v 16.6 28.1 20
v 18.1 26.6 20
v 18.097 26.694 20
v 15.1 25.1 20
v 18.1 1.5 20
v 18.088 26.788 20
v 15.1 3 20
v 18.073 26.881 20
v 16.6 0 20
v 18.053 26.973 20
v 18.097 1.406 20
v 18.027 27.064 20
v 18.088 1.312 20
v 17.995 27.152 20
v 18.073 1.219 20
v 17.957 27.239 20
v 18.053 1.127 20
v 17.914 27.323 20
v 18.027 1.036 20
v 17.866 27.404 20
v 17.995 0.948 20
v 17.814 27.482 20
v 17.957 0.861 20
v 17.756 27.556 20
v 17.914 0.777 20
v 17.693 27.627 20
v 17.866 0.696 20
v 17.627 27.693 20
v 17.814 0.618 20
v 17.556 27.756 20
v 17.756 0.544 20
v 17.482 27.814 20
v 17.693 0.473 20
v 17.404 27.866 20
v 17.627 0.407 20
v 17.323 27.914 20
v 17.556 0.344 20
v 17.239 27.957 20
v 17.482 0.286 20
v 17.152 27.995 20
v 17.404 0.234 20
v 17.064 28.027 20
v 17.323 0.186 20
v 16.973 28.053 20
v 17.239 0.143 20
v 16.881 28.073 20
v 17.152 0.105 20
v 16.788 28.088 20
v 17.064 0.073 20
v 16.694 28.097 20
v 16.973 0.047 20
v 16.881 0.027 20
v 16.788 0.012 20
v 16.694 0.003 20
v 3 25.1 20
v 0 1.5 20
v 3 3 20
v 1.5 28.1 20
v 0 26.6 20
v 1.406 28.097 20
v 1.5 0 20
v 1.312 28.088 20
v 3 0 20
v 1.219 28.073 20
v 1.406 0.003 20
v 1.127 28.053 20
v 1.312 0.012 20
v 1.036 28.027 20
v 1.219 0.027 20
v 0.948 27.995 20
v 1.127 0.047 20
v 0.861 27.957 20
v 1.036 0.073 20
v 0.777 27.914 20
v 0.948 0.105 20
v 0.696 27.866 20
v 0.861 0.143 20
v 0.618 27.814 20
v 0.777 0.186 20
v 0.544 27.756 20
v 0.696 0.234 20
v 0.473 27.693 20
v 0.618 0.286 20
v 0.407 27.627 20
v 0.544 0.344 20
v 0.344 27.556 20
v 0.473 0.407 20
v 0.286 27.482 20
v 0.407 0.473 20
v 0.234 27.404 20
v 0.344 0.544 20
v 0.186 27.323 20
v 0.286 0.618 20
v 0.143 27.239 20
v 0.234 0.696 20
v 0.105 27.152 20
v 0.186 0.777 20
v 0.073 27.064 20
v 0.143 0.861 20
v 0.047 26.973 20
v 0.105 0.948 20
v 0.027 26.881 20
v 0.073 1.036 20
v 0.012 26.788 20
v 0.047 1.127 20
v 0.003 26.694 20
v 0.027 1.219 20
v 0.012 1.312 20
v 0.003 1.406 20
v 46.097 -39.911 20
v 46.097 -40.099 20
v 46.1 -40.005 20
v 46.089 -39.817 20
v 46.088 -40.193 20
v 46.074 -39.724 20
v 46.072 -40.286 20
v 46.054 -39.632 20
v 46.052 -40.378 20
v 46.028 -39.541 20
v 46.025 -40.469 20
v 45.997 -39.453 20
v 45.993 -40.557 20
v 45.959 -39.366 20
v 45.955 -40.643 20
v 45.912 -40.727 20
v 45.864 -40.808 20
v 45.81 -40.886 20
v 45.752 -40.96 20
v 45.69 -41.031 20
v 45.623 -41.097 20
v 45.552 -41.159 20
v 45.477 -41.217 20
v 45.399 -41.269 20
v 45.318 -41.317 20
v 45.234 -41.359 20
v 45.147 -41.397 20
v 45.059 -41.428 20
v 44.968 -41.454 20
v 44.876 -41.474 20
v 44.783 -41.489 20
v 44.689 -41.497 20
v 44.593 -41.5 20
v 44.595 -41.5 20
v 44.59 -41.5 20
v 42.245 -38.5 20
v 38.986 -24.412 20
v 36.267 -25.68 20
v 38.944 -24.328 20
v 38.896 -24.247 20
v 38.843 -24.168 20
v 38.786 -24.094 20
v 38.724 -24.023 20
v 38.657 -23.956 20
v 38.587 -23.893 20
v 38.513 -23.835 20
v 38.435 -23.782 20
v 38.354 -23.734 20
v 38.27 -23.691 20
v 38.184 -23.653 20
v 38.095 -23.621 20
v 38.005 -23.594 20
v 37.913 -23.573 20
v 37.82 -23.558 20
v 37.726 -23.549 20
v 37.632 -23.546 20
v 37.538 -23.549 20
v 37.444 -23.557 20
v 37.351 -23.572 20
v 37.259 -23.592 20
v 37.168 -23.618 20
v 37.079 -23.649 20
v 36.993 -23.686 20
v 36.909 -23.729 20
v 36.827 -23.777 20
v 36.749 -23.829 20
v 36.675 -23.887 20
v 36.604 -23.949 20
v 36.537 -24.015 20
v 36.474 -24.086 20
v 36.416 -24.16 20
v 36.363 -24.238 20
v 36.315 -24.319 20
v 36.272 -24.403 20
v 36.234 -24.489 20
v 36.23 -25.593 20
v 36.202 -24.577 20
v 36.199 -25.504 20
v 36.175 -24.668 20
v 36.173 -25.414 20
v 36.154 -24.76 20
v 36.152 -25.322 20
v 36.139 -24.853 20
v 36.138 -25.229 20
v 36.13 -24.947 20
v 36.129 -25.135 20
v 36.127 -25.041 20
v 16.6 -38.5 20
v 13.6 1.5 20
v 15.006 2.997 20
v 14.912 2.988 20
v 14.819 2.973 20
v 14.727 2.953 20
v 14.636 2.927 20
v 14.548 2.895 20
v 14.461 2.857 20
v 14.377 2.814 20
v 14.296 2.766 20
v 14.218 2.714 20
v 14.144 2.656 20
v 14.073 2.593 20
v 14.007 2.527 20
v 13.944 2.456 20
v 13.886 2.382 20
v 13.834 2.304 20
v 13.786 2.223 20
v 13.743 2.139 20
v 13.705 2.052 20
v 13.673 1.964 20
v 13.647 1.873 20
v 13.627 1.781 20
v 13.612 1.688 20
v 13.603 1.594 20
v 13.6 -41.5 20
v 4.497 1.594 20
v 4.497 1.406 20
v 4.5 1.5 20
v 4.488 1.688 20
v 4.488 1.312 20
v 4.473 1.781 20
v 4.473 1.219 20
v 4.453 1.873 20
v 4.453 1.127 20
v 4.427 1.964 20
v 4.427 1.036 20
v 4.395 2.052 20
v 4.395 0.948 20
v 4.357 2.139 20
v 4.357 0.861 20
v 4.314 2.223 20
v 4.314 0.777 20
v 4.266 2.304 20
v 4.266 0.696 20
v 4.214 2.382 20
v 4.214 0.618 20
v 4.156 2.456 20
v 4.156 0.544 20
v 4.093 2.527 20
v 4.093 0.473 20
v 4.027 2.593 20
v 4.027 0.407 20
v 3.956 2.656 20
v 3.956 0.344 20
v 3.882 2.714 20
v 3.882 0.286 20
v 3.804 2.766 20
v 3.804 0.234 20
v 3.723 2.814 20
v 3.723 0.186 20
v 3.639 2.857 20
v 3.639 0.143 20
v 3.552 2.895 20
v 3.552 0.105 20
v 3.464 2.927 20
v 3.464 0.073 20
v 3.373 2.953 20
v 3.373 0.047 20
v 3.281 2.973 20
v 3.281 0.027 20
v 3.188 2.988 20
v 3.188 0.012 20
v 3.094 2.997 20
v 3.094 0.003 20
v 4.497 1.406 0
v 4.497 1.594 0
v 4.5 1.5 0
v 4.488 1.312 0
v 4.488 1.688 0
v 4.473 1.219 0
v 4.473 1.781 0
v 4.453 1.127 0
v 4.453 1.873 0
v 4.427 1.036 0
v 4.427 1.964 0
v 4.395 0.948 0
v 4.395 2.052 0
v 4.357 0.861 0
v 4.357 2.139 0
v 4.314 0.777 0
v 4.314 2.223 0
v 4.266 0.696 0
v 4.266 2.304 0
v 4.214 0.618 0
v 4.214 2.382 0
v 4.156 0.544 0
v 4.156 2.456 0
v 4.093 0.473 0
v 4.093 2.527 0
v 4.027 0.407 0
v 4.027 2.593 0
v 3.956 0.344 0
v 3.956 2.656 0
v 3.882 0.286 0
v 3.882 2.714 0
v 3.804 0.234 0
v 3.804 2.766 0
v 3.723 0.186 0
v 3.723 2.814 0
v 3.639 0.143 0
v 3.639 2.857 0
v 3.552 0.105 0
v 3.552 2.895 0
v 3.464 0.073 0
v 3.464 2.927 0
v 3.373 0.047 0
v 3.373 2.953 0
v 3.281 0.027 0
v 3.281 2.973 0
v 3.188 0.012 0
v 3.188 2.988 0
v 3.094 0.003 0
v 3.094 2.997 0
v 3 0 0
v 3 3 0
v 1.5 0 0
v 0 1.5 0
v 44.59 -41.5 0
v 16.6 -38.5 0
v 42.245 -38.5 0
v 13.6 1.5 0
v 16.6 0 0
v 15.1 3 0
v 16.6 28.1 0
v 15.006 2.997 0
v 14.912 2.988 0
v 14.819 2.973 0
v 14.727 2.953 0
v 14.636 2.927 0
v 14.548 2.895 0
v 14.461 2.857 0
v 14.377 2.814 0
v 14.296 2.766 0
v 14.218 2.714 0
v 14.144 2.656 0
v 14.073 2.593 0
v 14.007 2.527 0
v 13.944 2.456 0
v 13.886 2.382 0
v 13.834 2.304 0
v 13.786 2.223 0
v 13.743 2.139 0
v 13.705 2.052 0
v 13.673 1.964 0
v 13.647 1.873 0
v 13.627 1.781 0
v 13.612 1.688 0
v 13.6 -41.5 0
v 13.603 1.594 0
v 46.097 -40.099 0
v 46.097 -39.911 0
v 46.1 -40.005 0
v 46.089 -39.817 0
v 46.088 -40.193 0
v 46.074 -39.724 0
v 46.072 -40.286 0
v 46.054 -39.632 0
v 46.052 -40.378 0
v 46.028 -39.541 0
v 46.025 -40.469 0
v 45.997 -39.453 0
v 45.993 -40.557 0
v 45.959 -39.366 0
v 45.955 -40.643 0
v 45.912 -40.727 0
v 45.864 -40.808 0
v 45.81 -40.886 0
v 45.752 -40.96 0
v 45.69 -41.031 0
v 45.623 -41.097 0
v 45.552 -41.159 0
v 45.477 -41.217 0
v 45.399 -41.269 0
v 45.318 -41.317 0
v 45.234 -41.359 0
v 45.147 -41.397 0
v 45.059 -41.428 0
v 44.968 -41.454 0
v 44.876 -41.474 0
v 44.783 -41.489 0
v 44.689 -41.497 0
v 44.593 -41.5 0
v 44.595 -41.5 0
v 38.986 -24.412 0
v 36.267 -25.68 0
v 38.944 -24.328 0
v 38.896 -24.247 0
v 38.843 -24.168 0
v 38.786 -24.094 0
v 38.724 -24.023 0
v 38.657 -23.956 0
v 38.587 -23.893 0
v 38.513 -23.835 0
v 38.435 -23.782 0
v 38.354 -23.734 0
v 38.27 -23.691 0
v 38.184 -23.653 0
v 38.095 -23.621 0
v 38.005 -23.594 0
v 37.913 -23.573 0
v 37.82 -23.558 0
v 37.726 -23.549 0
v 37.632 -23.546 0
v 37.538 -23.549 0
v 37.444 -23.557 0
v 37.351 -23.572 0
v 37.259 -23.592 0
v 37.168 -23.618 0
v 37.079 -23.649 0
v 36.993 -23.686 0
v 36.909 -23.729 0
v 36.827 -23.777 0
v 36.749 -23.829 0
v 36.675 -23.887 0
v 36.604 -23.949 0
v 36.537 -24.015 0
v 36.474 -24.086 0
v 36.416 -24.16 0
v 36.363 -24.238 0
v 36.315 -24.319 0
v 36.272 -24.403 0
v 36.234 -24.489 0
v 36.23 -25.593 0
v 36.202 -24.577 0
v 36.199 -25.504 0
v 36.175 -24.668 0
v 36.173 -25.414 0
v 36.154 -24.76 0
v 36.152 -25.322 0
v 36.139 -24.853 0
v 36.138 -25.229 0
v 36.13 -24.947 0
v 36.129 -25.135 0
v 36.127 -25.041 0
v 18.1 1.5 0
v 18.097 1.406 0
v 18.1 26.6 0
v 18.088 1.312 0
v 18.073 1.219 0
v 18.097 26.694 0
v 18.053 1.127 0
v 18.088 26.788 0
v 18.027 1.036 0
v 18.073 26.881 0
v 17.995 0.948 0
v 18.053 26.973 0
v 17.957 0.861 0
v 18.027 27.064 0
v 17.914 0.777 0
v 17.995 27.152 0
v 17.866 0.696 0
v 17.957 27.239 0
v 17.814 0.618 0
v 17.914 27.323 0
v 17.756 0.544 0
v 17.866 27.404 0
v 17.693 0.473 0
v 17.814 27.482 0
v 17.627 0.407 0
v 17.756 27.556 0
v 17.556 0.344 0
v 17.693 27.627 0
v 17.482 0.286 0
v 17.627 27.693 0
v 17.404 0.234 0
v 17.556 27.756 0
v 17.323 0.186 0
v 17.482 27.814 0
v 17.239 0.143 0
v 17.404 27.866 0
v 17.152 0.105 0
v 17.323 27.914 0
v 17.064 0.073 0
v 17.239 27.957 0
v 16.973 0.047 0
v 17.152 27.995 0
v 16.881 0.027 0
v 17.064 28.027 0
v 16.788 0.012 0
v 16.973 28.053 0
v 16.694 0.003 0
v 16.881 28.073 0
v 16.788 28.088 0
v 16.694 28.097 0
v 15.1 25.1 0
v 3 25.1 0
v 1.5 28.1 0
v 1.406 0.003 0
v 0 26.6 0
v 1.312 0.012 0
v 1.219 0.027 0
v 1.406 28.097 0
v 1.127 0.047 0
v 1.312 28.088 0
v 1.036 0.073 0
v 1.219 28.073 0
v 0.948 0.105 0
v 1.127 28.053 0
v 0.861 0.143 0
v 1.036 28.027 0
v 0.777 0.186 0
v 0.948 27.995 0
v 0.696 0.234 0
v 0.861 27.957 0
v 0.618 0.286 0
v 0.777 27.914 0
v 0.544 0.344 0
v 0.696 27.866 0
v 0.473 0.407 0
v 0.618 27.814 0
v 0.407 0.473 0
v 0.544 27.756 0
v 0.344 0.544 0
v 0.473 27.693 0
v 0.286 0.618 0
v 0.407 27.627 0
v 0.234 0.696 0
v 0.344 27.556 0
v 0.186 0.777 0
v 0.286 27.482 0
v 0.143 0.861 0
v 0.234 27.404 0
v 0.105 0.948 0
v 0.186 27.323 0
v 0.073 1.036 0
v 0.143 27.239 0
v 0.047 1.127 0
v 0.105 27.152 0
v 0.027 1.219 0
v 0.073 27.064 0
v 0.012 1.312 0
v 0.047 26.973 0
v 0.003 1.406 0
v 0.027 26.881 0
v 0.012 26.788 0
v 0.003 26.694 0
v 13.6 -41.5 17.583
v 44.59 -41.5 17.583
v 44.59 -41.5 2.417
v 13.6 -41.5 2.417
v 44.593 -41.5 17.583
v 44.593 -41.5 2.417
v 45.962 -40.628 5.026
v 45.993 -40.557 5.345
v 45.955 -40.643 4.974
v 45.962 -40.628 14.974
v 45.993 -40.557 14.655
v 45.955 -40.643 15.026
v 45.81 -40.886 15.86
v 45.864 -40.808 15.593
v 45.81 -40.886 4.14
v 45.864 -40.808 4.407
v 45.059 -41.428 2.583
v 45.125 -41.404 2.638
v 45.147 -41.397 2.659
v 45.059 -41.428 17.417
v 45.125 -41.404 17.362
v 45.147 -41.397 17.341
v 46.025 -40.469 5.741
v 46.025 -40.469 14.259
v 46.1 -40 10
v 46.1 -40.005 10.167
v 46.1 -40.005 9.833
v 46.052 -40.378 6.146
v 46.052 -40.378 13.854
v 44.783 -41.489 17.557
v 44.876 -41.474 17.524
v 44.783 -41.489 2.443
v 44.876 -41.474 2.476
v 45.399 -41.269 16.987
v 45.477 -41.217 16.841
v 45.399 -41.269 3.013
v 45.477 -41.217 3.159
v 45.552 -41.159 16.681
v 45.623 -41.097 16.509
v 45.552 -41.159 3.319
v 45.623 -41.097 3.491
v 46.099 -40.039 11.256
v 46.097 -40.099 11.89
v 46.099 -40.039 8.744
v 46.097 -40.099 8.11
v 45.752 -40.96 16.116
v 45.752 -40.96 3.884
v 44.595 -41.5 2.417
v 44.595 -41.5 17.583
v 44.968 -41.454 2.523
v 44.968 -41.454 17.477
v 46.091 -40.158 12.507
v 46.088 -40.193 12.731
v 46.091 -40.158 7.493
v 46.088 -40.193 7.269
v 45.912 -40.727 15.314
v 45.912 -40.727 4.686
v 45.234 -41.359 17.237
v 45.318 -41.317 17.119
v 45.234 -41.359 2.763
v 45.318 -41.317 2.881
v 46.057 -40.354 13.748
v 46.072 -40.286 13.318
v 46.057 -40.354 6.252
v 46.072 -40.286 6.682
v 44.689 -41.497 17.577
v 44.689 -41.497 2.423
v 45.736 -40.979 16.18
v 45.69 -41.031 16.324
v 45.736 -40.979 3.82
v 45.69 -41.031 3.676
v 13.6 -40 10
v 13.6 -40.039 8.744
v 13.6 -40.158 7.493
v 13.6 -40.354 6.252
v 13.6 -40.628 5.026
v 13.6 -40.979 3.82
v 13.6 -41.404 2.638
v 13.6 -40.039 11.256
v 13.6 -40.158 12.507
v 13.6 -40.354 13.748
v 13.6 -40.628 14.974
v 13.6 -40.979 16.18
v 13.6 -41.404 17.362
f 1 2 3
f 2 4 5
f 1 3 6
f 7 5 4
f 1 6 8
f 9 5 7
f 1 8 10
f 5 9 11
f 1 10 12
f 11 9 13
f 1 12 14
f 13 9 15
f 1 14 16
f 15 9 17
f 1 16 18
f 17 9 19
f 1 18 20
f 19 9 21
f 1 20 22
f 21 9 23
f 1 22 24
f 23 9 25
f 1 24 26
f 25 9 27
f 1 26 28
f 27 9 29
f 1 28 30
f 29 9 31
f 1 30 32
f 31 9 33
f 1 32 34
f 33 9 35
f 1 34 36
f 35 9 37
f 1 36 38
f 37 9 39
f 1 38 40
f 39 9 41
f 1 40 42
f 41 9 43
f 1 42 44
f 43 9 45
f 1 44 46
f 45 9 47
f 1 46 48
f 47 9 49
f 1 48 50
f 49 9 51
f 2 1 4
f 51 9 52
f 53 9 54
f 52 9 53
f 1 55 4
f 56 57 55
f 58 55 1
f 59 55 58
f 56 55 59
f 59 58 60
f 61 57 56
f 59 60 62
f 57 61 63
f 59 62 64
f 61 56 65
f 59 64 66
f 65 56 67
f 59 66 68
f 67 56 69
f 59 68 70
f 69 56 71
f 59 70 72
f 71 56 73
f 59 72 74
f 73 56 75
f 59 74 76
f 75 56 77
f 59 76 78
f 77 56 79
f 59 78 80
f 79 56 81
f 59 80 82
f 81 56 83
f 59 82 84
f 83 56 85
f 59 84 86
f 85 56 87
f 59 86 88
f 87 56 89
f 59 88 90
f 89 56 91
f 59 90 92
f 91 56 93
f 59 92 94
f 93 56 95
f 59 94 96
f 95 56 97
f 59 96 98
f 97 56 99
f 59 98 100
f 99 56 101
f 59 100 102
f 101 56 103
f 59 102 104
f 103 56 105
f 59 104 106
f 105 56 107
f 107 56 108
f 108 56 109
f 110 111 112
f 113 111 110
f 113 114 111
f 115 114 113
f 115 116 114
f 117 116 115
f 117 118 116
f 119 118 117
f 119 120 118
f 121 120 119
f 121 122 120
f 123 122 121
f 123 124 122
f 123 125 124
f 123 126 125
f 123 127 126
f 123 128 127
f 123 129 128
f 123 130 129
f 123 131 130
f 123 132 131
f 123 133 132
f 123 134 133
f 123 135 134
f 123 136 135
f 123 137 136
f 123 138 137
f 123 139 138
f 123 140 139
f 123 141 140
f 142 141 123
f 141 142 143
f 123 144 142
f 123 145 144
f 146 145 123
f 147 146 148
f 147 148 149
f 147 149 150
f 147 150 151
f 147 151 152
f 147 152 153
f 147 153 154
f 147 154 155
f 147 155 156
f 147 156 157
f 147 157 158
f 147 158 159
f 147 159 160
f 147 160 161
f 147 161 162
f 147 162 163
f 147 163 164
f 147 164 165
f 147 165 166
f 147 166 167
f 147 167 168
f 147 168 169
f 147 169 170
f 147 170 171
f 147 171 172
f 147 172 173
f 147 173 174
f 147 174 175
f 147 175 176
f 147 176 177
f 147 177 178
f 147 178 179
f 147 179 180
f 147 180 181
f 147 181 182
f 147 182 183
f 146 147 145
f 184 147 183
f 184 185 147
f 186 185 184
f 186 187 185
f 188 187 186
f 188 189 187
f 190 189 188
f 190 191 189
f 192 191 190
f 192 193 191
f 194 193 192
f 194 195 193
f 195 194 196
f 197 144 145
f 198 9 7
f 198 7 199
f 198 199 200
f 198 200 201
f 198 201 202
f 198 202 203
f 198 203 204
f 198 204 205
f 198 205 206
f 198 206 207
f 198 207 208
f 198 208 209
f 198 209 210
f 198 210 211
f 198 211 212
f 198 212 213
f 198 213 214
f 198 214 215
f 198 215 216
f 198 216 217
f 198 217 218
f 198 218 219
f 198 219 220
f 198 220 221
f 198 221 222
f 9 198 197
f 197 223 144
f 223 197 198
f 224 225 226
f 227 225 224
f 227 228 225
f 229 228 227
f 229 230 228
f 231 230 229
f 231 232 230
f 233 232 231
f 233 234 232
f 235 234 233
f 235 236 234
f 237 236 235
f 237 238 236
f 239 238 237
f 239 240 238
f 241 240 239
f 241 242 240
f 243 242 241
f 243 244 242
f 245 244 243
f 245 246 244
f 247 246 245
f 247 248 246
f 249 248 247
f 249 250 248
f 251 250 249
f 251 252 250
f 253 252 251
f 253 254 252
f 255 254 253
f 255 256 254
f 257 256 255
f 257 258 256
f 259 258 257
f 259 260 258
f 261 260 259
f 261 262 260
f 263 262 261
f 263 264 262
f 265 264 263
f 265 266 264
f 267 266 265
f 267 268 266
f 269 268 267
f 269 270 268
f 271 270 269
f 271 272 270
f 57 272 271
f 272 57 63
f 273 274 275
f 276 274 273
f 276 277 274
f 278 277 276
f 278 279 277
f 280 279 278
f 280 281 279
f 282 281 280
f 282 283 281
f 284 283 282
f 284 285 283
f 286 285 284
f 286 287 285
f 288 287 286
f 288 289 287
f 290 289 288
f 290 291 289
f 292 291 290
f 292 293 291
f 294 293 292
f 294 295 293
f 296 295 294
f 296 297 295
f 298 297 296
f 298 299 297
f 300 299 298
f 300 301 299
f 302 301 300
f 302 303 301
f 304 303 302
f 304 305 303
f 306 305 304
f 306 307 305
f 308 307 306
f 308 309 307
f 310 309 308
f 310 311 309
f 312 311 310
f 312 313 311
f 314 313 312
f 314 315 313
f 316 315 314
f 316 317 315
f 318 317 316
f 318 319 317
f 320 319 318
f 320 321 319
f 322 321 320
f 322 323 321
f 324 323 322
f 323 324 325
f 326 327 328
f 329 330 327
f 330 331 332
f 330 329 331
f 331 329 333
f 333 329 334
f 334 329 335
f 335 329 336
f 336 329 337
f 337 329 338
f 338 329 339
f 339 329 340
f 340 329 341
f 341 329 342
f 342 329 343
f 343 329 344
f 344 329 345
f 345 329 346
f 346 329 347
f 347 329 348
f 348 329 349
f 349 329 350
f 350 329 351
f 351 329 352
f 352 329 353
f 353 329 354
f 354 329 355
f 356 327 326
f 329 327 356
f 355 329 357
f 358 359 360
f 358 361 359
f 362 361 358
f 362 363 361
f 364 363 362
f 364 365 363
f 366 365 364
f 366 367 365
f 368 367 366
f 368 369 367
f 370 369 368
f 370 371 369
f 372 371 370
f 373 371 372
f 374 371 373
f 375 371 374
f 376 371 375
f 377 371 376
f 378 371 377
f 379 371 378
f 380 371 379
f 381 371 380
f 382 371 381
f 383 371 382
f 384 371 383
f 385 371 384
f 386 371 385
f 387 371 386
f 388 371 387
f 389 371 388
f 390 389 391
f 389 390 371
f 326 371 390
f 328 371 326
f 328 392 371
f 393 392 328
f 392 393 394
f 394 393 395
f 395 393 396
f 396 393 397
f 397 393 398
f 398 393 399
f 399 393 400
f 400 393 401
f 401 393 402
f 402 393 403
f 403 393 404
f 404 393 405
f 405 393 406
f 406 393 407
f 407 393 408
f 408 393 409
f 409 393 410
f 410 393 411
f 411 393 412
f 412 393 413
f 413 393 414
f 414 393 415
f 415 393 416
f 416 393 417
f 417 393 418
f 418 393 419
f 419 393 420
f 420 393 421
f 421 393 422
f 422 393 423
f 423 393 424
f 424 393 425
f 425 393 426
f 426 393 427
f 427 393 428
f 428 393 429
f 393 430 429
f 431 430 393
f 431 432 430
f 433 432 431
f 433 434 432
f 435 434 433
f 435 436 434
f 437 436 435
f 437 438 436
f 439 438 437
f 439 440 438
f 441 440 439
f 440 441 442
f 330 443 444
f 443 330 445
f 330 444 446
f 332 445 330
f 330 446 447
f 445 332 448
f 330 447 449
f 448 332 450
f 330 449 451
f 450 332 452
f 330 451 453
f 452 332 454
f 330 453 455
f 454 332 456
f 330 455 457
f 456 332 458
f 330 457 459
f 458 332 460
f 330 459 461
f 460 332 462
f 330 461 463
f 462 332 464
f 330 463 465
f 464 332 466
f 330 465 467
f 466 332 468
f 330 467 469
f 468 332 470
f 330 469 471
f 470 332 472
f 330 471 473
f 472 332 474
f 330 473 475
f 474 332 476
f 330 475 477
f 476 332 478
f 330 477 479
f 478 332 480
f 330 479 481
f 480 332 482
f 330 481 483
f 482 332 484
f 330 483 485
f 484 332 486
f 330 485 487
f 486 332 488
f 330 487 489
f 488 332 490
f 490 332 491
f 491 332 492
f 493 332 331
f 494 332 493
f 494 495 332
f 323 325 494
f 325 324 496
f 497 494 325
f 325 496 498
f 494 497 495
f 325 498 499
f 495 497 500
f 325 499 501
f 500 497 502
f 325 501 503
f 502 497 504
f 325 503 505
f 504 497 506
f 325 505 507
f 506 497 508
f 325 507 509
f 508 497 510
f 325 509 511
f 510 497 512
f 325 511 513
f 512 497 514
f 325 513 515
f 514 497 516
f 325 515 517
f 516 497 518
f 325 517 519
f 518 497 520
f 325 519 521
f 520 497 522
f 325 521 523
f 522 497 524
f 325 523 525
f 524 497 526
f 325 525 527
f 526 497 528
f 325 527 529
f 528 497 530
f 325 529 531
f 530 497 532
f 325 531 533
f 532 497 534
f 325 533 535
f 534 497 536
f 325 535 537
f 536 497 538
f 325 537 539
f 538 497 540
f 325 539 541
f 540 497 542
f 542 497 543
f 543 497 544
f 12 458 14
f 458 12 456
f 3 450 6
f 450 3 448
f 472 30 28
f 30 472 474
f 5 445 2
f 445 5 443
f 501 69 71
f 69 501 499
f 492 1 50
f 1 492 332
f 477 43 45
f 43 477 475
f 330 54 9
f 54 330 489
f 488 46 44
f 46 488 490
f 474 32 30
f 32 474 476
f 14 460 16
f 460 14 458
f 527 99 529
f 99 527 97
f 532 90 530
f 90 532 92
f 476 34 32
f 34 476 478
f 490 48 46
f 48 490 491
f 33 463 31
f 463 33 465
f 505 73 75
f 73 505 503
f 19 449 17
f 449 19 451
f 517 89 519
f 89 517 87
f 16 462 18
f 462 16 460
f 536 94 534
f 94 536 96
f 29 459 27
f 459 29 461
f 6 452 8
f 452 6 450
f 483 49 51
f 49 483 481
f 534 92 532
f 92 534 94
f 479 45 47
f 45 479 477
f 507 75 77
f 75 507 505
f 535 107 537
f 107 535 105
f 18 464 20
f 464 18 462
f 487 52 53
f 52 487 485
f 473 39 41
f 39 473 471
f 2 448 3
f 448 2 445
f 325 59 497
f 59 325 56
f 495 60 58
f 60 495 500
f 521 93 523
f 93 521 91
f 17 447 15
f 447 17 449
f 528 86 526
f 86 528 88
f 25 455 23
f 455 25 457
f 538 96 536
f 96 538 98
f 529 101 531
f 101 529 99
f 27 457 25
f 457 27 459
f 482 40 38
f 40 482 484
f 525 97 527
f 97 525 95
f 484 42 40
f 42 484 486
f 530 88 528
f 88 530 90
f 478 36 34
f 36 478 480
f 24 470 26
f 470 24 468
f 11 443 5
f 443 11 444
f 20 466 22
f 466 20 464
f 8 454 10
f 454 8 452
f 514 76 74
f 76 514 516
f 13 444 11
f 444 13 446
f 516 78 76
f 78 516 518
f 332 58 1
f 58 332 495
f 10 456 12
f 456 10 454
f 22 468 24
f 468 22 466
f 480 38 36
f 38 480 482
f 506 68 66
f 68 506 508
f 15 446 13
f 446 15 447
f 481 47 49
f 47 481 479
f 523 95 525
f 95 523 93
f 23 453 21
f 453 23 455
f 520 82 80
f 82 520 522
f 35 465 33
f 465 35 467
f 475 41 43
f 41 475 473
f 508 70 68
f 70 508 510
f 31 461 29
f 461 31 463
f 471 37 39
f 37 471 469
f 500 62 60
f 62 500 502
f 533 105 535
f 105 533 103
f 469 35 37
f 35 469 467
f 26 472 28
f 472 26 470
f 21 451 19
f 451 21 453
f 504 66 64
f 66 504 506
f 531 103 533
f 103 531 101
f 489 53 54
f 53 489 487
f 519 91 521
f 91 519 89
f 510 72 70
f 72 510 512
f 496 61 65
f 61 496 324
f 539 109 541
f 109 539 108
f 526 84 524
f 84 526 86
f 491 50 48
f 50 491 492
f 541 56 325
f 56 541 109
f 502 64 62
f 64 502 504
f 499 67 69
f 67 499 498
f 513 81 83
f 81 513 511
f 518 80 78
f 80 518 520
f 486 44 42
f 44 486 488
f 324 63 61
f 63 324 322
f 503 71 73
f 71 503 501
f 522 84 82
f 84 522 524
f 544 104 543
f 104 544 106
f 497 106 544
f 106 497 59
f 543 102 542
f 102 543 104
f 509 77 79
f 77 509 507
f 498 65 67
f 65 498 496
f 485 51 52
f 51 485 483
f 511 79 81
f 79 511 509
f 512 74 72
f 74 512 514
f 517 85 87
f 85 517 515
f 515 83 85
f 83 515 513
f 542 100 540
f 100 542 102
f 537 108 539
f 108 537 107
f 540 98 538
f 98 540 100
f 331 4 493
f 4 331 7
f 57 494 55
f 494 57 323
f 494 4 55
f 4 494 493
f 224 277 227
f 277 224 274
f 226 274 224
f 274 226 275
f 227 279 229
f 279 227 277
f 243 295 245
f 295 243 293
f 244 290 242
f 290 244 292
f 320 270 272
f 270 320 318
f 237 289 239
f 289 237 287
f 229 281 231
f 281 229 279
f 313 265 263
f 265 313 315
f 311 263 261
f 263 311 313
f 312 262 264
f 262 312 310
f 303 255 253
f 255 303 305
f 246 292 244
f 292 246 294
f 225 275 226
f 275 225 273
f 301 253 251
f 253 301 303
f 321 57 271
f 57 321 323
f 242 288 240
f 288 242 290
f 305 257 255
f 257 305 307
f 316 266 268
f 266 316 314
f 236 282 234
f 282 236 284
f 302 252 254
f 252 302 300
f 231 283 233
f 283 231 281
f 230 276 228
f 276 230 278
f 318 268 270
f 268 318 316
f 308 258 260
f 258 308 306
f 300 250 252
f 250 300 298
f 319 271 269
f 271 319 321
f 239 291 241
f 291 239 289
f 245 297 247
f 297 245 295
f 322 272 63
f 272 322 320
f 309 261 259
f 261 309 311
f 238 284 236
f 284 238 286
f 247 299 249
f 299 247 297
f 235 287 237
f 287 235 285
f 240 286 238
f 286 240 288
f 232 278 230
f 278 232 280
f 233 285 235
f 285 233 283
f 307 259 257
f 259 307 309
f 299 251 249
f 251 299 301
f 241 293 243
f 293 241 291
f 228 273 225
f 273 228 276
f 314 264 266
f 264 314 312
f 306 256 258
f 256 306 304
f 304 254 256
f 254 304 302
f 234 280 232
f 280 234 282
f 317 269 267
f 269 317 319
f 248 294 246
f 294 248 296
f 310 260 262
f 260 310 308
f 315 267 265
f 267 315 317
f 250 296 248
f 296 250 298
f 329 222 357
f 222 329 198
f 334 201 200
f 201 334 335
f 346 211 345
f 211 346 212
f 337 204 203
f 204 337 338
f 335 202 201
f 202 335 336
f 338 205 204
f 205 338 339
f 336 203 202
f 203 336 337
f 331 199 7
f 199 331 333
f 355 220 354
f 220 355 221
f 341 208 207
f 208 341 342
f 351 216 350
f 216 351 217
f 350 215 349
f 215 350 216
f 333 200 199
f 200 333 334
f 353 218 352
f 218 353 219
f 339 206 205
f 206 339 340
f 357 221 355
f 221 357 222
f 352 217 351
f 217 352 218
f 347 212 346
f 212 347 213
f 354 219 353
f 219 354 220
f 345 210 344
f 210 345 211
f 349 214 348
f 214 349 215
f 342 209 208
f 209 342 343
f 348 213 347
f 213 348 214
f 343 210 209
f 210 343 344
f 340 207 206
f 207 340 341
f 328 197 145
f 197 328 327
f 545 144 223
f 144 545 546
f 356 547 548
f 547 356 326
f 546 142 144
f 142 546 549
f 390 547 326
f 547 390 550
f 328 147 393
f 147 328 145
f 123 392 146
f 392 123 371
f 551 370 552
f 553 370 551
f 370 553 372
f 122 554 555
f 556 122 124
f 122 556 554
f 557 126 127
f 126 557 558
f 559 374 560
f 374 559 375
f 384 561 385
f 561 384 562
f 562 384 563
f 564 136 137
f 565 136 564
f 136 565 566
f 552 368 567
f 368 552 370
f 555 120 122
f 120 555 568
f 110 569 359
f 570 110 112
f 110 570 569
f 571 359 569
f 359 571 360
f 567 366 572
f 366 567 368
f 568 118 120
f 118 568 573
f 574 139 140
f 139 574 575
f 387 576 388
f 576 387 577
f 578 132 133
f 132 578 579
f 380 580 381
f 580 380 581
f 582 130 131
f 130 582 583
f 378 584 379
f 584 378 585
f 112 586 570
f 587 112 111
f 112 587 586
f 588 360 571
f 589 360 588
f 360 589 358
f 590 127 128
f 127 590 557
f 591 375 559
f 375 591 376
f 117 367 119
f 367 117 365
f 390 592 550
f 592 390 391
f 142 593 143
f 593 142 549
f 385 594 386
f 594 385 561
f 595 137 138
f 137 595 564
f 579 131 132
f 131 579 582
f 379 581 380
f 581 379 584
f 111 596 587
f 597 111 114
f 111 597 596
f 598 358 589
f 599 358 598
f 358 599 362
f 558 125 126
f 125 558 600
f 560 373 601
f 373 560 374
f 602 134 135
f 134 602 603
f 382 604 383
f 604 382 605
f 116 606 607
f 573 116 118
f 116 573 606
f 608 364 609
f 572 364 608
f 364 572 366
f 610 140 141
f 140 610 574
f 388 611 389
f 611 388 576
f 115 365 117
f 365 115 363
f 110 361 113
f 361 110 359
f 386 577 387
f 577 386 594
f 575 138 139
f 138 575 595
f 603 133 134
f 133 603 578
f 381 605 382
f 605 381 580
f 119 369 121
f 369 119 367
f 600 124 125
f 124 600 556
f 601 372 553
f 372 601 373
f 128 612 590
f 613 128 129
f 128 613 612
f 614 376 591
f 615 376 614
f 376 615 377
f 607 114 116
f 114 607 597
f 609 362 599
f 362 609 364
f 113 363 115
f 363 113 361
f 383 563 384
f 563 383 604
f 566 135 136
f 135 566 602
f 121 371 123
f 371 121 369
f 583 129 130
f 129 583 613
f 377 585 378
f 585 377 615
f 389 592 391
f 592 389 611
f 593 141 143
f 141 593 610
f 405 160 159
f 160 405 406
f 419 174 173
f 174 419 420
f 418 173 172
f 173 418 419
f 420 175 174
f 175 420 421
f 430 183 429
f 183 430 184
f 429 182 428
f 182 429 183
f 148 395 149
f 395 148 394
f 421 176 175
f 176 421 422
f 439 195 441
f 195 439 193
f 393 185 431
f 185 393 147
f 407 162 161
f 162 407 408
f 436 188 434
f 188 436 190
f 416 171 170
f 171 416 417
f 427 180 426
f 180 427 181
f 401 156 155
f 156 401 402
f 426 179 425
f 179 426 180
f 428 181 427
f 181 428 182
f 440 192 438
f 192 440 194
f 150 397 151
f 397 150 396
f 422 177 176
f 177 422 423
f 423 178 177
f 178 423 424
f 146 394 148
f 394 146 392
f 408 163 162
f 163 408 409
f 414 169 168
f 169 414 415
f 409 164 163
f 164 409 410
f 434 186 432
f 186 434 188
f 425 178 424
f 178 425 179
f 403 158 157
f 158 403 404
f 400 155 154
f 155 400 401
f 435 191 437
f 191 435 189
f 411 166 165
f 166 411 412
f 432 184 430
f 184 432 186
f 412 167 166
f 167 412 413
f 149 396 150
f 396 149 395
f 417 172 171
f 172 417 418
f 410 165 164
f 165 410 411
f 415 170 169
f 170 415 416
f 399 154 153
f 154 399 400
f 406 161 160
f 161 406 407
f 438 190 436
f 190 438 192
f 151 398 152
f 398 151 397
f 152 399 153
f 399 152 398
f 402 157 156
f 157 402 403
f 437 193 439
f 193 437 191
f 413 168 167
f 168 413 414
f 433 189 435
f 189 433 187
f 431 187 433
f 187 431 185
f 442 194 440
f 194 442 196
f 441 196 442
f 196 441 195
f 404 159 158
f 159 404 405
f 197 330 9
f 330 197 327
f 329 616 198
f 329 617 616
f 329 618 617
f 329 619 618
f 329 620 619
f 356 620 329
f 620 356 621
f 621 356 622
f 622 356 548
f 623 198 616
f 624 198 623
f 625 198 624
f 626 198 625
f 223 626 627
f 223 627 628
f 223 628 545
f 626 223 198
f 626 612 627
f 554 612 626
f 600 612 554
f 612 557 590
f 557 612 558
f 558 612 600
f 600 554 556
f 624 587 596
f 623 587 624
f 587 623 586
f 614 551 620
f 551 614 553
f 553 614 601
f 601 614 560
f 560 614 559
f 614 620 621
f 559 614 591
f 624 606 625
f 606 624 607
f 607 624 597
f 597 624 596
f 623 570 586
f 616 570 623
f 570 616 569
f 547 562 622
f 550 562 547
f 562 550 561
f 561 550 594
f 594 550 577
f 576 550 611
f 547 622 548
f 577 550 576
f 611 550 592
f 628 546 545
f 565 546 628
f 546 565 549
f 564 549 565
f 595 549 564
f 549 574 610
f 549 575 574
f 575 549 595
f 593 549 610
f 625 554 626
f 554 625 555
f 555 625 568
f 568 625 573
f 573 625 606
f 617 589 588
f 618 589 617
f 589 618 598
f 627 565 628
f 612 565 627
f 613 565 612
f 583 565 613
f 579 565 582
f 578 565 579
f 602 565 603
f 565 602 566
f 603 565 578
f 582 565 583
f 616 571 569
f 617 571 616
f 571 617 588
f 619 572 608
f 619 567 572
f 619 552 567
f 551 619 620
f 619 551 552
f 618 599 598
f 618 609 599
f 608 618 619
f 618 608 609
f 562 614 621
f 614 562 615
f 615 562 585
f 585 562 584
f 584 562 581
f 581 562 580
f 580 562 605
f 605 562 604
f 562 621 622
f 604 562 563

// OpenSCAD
// Shower panel hook
// Authored by: Aubrey Kilian aka MakerNewt@Thingiverse
// URL: https://www.thingiverse.com/makernewt/designs/
// Usage licence: Creative Commons Attribution - https://creativecommons.org/licenses/by/4.0/

// Notes:
// This is not perfect.  There are some combinations of values that will
// result in an unprintable mess.  Use with caution.
//


// Top plastic clip of panel thickness
Clip_Width = 12; // [10:50]

// Top plastic clip of panel height
Clip_Height = 22; // [10:50]

// Small clip width and height adjustment - just gets added to the Clip width and height values
Hook_Buffer_Space = 0.1; // [0:0.1:1]

// Radius of rounded corners for top clip part
Clip_Rounded_Corner_Radius = 1.5; // [0:0.1:3]

// Width of the top hook part that will clip over the shower panel
Hook_Width = 20; // [5:50]

// Thickness of all walls
Hook_Thickness = 3; // [1:0.1:5]

// Length of the leg going down, measured from the bottom of the top clip
Bottom_Leg_Length = 40; // [0:100]

// Length of the leg protruding at 90 degree angle from glass
Bottom_Protrude_Length = 25; // [10:100]

// Length of final hook part
Bottom_Hook_Length = 15; // [0:50]

// Angle at which final hook part is angled - 115 is a good number
Bottom_Hook_Angle=115;// [0:160]

// Whether to include the semi-circle cutout underneath the bottom protruding leg
Include_Cutout=true;

/* [Debug Parameters] */
// Do not print with this enabled, that would not be wise
Show_Glass_And_Plastic_Panel = false;
// Useful for debugging purposes, set the "Show_Glass_And_Plastic_Panel" variable to true
Glass_Width = 8;

/* [Hidden] */
eps = 0.01;

/********************************************************************************/
if(Show_Glass_And_Plastic_Panel) {
    #union() {
        // Glass
        translate([(Clip_Width + Hook_Buffer_Space + Hook_Thickness * 2)/2-Glass_Width/2,Hook_Thickness+eps+Hook_Buffer_Space/2,-Hook_Width/2])
            mirror([0,1,0])
                cube([Glass_Width, Clip_Height*10, Hook_Width*2]);
        // Plastic
        translate([Hook_Thickness+Hook_Buffer_Space/2,Hook_Thickness+Hook_Buffer_Space/2,-Hook_Width/2])
            cube([Clip_Width, Clip_Height, Hook_Width*2]);
    }

}

module main() {
    sanity_check();
    if(Include_Cutout) {
        difference() {
            MainBody();
            BottomHalfMoon();
        }
    } else {
        MainBody();
    }
}
module MainBody() {
    union()
    {
        difference()
        {
//        color("yellow")
            TopLipEnclosureShape();
            PlasticLipShape();
        }
//        color("red")
        HookClips();
        BottomHookShape();
    }
}

module TopLipEnclosureShape() {
    CUBE_INNER_SIZE_X = (Clip_Width + Hook_Buffer_Space)+(Hook_Thickness*2)-Clip_Rounded_Corner_Radius*2;
    CUBE_INNER_SIZE_Y = Clip_Height+Hook_Buffer_Space+(Hook_Thickness)-Clip_Rounded_Corner_Radius*2+Hook_Thickness;
    if(Clip_Rounded_Corner_Radius == 0) {
        cube([CUBE_INNER_SIZE_X,CUBE_INNER_SIZE_Y,Hook_Width]);
    } else {
        translate([Clip_Rounded_Corner_Radius,Clip_Rounded_Corner_Radius,0])
            cube([CUBE_INNER_SIZE_X,CUBE_INNER_SIZE_Y,Hook_Width]);
        
        TopHookCorners();
       
    }
}

module TopHookCorners() {
    TOP_HOOKS_POS_Y=Hook_Thickness+Clip_Height+Hook_Buffer_Space+Hook_Thickness;
    hull() {
        TopHookBottomCorners();
        translate([0,TOP_HOOKS_POS_Y,0])
            mirror([0,1,0])
                TopHookBottomCorners();
    }
}

module TopHookBottomCorners() {
    union() {
    // bottom-left
    TopHookOneCorner();
    
    // bottom-right
    translate([(Clip_Width + Hook_Buffer_Space)+Hook_Thickness*2,0,0])
        mirror([1,0,0])
            TopHookOneCorner();
    }
}

module TopHookOneCorner() {
    translate([Clip_Rounded_Corner_Radius,Clip_Rounded_Corner_Radius,0])
        difference() {
            translate([-Clip_Rounded_Corner_Radius,-Clip_Rounded_Corner_Radius,0])
                cube([Hook_Thickness,Hook_Thickness,Hook_Width]);

        translate([0,0,-eps])
            rotate([0,0,180])
                difference() {
                    cube([Hook_Thickness,Hook_Thickness,Hook_Width*2]);
                    translate([0,0,-eps])
                        cylinder(h=Hook_Width+1,r1=Clip_Rounded_Corner_Radius, r2=Clip_Rounded_Corner_Radius, $fn=100);
                }
            }
}

module PlasticLipShape() {
//color("cyan")    
    union() {
        // Plastic lip shape
        color("purple") 
        translate([Hook_Thickness,Hook_Thickness,-Hook_Width/2])
            cube([(Clip_Width + Hook_Buffer_Space), Clip_Height+Hook_Buffer_Space, Hook_Width*2]);

        // extra remove bottom piece
        color("red") 
        translate([Hook_Thickness,-0.1,-Hook_Width/2])
            cube([(Clip_Width + Hook_Buffer_Space), Hook_Thickness+0.2,Hook_Width*2]);
    }
}

    




module HookClips() {
    HookClip();
    translate([(Clip_Width + Hook_Buffer_Space)+(Hook_Thickness*2),0,0])
        mirror([1,0,0])
            HookClip();
}

module HookClip() {
    translate([Hook_Thickness,Hook_Thickness/2,0])
        cylinder(h=Hook_Width, r=Hook_Thickness/2, $fn=100, center=false);

}

module RotatedRoundRod(length, width, rotate_on_left=0, rotate_on_right=0, rotate_degrees=0) {
    
    assert(rotate_on_left != rotate_on_right, "You can't rotate on both ends, pick one!");
    
    if(rotate_on_left > 0) {
        translate([0,width/2,0])
            rotate([0,0,rotate_degrees])
                translate([0,-width/2,0])
                    Rod(length, width, 1, 1);
    }
    if(rotate_on_right > 0) {
        translate([length,width/2,0])
            rotate([0,0,rotate_degrees])
                translate([-length,-width/2,0])
                Rod(length, width, 1, 1);
    }
}
module Rod(length, width, rounded_left=0, rounded_right=0) {
    
    cube([length, width, Hook_Width]);
    if(rounded_left > 0) {
        translate([0,width/2,0])
            cylinder(r=width/2, h=Hook_Width, $fn=100);
    }
    if(rounded_right > 0) {
        translate([length,width/2,0])
        cylinder(r=width/2, h=Hook_Width, $fn=100);
    }
}


module BottomHalfMoon() {
    CYL_SIZE=Bottom_Protrude_Length + Hook_Thickness*3;

    HALFMOON_POS_X=Hook_Thickness/2+(Clip_Width + Hook_Buffer_Space)-eps;
    HALFMOON_POS_Y=-(Bottom_Leg_Length+Hook_Width);
    HALFMOON_POS_Z=Hook_Width/2;

    translate([HALFMOON_POS_X,HALFMOON_POS_Y,HALFMOON_POS_Z])
        rotate([0,90,0])
            cylinder(h=CYL_SIZE, r=Hook_Width, $fn=100);
}




module BottomHookShape() {

    // Down row
    DOWN_SIZE_X=Hook_Thickness;
    DOWN_SIZE_Y=Bottom_Leg_Length+Hook_Thickness;
    DOWN_VERT_POS_X=Hook_Thickness/2+(Clip_Width + Hook_Buffer_Space);
    DOWN_VERT_POS_Y=Hook_Thickness/2-DOWN_SIZE_Y;
    
//    color("red")
        translate([DOWN_VERT_POS_X,DOWN_VERT_POS_Y,0])
            Rod(DOWN_SIZE_X, DOWN_SIZE_Y);

    // Out rod
    OUT_VERT_POS_X=DOWN_VERT_POS_X+Hook_Thickness-eps;
    OUT_VERT_POS_Y=-DOWN_SIZE_Y+Hook_Thickness/2;
    OUT_SIZE_X=Bottom_Protrude_Length+Hook_Thickness;
    OUT_SIZE_Y=Hook_Thickness;
    
//    color("yellow")
    translate([OUT_VERT_POS_X,OUT_VERT_POS_Y,0])
        Rod(OUT_SIZE_X, OUT_SIZE_Y, 0, 1);
    
    // Up-and-back-hook
    BACK_DOWN_SIZE_X=Hook_Thickness;
    BACK_DOWN_SIZE_Y=Bottom_Hook_Length+Hook_Thickness/2;
    BACK_VERT_POS_X=DOWN_VERT_POS_X+OUT_SIZE_X+Hook_Thickness;
    BACK_VERT_POS_Y=-DOWN_SIZE_Y+Hook_Thickness/2;

//    color("cyan")
    translate([BACK_VERT_POS_X,BACK_VERT_POS_Y,0])
        RotatedRoundRod(BACK_DOWN_SIZE_Y,BACK_DOWN_SIZE_X,1,0,Bottom_Hook_Angle);

}

module sanity_check() {
    
    assert(Clip_Width > Glass_Width, "Clip_Width cannot be smaller than Glass_Width");
    assert(Hook_Thickness >= Clip_Rounded_Corner_Radius, "Hook_Thickness cannot be smaller than Clip_Rounded_Corner_Radius, it causes irregularites on the corners.");
    assert(Hook_Thickness >= Clip_Rounded_Corner_Radius, "Hook_Thickness needs to be bigger than Clip_Rounded_Corner_Radius, or else some unexpected behaviour could occur.");
}



main();
